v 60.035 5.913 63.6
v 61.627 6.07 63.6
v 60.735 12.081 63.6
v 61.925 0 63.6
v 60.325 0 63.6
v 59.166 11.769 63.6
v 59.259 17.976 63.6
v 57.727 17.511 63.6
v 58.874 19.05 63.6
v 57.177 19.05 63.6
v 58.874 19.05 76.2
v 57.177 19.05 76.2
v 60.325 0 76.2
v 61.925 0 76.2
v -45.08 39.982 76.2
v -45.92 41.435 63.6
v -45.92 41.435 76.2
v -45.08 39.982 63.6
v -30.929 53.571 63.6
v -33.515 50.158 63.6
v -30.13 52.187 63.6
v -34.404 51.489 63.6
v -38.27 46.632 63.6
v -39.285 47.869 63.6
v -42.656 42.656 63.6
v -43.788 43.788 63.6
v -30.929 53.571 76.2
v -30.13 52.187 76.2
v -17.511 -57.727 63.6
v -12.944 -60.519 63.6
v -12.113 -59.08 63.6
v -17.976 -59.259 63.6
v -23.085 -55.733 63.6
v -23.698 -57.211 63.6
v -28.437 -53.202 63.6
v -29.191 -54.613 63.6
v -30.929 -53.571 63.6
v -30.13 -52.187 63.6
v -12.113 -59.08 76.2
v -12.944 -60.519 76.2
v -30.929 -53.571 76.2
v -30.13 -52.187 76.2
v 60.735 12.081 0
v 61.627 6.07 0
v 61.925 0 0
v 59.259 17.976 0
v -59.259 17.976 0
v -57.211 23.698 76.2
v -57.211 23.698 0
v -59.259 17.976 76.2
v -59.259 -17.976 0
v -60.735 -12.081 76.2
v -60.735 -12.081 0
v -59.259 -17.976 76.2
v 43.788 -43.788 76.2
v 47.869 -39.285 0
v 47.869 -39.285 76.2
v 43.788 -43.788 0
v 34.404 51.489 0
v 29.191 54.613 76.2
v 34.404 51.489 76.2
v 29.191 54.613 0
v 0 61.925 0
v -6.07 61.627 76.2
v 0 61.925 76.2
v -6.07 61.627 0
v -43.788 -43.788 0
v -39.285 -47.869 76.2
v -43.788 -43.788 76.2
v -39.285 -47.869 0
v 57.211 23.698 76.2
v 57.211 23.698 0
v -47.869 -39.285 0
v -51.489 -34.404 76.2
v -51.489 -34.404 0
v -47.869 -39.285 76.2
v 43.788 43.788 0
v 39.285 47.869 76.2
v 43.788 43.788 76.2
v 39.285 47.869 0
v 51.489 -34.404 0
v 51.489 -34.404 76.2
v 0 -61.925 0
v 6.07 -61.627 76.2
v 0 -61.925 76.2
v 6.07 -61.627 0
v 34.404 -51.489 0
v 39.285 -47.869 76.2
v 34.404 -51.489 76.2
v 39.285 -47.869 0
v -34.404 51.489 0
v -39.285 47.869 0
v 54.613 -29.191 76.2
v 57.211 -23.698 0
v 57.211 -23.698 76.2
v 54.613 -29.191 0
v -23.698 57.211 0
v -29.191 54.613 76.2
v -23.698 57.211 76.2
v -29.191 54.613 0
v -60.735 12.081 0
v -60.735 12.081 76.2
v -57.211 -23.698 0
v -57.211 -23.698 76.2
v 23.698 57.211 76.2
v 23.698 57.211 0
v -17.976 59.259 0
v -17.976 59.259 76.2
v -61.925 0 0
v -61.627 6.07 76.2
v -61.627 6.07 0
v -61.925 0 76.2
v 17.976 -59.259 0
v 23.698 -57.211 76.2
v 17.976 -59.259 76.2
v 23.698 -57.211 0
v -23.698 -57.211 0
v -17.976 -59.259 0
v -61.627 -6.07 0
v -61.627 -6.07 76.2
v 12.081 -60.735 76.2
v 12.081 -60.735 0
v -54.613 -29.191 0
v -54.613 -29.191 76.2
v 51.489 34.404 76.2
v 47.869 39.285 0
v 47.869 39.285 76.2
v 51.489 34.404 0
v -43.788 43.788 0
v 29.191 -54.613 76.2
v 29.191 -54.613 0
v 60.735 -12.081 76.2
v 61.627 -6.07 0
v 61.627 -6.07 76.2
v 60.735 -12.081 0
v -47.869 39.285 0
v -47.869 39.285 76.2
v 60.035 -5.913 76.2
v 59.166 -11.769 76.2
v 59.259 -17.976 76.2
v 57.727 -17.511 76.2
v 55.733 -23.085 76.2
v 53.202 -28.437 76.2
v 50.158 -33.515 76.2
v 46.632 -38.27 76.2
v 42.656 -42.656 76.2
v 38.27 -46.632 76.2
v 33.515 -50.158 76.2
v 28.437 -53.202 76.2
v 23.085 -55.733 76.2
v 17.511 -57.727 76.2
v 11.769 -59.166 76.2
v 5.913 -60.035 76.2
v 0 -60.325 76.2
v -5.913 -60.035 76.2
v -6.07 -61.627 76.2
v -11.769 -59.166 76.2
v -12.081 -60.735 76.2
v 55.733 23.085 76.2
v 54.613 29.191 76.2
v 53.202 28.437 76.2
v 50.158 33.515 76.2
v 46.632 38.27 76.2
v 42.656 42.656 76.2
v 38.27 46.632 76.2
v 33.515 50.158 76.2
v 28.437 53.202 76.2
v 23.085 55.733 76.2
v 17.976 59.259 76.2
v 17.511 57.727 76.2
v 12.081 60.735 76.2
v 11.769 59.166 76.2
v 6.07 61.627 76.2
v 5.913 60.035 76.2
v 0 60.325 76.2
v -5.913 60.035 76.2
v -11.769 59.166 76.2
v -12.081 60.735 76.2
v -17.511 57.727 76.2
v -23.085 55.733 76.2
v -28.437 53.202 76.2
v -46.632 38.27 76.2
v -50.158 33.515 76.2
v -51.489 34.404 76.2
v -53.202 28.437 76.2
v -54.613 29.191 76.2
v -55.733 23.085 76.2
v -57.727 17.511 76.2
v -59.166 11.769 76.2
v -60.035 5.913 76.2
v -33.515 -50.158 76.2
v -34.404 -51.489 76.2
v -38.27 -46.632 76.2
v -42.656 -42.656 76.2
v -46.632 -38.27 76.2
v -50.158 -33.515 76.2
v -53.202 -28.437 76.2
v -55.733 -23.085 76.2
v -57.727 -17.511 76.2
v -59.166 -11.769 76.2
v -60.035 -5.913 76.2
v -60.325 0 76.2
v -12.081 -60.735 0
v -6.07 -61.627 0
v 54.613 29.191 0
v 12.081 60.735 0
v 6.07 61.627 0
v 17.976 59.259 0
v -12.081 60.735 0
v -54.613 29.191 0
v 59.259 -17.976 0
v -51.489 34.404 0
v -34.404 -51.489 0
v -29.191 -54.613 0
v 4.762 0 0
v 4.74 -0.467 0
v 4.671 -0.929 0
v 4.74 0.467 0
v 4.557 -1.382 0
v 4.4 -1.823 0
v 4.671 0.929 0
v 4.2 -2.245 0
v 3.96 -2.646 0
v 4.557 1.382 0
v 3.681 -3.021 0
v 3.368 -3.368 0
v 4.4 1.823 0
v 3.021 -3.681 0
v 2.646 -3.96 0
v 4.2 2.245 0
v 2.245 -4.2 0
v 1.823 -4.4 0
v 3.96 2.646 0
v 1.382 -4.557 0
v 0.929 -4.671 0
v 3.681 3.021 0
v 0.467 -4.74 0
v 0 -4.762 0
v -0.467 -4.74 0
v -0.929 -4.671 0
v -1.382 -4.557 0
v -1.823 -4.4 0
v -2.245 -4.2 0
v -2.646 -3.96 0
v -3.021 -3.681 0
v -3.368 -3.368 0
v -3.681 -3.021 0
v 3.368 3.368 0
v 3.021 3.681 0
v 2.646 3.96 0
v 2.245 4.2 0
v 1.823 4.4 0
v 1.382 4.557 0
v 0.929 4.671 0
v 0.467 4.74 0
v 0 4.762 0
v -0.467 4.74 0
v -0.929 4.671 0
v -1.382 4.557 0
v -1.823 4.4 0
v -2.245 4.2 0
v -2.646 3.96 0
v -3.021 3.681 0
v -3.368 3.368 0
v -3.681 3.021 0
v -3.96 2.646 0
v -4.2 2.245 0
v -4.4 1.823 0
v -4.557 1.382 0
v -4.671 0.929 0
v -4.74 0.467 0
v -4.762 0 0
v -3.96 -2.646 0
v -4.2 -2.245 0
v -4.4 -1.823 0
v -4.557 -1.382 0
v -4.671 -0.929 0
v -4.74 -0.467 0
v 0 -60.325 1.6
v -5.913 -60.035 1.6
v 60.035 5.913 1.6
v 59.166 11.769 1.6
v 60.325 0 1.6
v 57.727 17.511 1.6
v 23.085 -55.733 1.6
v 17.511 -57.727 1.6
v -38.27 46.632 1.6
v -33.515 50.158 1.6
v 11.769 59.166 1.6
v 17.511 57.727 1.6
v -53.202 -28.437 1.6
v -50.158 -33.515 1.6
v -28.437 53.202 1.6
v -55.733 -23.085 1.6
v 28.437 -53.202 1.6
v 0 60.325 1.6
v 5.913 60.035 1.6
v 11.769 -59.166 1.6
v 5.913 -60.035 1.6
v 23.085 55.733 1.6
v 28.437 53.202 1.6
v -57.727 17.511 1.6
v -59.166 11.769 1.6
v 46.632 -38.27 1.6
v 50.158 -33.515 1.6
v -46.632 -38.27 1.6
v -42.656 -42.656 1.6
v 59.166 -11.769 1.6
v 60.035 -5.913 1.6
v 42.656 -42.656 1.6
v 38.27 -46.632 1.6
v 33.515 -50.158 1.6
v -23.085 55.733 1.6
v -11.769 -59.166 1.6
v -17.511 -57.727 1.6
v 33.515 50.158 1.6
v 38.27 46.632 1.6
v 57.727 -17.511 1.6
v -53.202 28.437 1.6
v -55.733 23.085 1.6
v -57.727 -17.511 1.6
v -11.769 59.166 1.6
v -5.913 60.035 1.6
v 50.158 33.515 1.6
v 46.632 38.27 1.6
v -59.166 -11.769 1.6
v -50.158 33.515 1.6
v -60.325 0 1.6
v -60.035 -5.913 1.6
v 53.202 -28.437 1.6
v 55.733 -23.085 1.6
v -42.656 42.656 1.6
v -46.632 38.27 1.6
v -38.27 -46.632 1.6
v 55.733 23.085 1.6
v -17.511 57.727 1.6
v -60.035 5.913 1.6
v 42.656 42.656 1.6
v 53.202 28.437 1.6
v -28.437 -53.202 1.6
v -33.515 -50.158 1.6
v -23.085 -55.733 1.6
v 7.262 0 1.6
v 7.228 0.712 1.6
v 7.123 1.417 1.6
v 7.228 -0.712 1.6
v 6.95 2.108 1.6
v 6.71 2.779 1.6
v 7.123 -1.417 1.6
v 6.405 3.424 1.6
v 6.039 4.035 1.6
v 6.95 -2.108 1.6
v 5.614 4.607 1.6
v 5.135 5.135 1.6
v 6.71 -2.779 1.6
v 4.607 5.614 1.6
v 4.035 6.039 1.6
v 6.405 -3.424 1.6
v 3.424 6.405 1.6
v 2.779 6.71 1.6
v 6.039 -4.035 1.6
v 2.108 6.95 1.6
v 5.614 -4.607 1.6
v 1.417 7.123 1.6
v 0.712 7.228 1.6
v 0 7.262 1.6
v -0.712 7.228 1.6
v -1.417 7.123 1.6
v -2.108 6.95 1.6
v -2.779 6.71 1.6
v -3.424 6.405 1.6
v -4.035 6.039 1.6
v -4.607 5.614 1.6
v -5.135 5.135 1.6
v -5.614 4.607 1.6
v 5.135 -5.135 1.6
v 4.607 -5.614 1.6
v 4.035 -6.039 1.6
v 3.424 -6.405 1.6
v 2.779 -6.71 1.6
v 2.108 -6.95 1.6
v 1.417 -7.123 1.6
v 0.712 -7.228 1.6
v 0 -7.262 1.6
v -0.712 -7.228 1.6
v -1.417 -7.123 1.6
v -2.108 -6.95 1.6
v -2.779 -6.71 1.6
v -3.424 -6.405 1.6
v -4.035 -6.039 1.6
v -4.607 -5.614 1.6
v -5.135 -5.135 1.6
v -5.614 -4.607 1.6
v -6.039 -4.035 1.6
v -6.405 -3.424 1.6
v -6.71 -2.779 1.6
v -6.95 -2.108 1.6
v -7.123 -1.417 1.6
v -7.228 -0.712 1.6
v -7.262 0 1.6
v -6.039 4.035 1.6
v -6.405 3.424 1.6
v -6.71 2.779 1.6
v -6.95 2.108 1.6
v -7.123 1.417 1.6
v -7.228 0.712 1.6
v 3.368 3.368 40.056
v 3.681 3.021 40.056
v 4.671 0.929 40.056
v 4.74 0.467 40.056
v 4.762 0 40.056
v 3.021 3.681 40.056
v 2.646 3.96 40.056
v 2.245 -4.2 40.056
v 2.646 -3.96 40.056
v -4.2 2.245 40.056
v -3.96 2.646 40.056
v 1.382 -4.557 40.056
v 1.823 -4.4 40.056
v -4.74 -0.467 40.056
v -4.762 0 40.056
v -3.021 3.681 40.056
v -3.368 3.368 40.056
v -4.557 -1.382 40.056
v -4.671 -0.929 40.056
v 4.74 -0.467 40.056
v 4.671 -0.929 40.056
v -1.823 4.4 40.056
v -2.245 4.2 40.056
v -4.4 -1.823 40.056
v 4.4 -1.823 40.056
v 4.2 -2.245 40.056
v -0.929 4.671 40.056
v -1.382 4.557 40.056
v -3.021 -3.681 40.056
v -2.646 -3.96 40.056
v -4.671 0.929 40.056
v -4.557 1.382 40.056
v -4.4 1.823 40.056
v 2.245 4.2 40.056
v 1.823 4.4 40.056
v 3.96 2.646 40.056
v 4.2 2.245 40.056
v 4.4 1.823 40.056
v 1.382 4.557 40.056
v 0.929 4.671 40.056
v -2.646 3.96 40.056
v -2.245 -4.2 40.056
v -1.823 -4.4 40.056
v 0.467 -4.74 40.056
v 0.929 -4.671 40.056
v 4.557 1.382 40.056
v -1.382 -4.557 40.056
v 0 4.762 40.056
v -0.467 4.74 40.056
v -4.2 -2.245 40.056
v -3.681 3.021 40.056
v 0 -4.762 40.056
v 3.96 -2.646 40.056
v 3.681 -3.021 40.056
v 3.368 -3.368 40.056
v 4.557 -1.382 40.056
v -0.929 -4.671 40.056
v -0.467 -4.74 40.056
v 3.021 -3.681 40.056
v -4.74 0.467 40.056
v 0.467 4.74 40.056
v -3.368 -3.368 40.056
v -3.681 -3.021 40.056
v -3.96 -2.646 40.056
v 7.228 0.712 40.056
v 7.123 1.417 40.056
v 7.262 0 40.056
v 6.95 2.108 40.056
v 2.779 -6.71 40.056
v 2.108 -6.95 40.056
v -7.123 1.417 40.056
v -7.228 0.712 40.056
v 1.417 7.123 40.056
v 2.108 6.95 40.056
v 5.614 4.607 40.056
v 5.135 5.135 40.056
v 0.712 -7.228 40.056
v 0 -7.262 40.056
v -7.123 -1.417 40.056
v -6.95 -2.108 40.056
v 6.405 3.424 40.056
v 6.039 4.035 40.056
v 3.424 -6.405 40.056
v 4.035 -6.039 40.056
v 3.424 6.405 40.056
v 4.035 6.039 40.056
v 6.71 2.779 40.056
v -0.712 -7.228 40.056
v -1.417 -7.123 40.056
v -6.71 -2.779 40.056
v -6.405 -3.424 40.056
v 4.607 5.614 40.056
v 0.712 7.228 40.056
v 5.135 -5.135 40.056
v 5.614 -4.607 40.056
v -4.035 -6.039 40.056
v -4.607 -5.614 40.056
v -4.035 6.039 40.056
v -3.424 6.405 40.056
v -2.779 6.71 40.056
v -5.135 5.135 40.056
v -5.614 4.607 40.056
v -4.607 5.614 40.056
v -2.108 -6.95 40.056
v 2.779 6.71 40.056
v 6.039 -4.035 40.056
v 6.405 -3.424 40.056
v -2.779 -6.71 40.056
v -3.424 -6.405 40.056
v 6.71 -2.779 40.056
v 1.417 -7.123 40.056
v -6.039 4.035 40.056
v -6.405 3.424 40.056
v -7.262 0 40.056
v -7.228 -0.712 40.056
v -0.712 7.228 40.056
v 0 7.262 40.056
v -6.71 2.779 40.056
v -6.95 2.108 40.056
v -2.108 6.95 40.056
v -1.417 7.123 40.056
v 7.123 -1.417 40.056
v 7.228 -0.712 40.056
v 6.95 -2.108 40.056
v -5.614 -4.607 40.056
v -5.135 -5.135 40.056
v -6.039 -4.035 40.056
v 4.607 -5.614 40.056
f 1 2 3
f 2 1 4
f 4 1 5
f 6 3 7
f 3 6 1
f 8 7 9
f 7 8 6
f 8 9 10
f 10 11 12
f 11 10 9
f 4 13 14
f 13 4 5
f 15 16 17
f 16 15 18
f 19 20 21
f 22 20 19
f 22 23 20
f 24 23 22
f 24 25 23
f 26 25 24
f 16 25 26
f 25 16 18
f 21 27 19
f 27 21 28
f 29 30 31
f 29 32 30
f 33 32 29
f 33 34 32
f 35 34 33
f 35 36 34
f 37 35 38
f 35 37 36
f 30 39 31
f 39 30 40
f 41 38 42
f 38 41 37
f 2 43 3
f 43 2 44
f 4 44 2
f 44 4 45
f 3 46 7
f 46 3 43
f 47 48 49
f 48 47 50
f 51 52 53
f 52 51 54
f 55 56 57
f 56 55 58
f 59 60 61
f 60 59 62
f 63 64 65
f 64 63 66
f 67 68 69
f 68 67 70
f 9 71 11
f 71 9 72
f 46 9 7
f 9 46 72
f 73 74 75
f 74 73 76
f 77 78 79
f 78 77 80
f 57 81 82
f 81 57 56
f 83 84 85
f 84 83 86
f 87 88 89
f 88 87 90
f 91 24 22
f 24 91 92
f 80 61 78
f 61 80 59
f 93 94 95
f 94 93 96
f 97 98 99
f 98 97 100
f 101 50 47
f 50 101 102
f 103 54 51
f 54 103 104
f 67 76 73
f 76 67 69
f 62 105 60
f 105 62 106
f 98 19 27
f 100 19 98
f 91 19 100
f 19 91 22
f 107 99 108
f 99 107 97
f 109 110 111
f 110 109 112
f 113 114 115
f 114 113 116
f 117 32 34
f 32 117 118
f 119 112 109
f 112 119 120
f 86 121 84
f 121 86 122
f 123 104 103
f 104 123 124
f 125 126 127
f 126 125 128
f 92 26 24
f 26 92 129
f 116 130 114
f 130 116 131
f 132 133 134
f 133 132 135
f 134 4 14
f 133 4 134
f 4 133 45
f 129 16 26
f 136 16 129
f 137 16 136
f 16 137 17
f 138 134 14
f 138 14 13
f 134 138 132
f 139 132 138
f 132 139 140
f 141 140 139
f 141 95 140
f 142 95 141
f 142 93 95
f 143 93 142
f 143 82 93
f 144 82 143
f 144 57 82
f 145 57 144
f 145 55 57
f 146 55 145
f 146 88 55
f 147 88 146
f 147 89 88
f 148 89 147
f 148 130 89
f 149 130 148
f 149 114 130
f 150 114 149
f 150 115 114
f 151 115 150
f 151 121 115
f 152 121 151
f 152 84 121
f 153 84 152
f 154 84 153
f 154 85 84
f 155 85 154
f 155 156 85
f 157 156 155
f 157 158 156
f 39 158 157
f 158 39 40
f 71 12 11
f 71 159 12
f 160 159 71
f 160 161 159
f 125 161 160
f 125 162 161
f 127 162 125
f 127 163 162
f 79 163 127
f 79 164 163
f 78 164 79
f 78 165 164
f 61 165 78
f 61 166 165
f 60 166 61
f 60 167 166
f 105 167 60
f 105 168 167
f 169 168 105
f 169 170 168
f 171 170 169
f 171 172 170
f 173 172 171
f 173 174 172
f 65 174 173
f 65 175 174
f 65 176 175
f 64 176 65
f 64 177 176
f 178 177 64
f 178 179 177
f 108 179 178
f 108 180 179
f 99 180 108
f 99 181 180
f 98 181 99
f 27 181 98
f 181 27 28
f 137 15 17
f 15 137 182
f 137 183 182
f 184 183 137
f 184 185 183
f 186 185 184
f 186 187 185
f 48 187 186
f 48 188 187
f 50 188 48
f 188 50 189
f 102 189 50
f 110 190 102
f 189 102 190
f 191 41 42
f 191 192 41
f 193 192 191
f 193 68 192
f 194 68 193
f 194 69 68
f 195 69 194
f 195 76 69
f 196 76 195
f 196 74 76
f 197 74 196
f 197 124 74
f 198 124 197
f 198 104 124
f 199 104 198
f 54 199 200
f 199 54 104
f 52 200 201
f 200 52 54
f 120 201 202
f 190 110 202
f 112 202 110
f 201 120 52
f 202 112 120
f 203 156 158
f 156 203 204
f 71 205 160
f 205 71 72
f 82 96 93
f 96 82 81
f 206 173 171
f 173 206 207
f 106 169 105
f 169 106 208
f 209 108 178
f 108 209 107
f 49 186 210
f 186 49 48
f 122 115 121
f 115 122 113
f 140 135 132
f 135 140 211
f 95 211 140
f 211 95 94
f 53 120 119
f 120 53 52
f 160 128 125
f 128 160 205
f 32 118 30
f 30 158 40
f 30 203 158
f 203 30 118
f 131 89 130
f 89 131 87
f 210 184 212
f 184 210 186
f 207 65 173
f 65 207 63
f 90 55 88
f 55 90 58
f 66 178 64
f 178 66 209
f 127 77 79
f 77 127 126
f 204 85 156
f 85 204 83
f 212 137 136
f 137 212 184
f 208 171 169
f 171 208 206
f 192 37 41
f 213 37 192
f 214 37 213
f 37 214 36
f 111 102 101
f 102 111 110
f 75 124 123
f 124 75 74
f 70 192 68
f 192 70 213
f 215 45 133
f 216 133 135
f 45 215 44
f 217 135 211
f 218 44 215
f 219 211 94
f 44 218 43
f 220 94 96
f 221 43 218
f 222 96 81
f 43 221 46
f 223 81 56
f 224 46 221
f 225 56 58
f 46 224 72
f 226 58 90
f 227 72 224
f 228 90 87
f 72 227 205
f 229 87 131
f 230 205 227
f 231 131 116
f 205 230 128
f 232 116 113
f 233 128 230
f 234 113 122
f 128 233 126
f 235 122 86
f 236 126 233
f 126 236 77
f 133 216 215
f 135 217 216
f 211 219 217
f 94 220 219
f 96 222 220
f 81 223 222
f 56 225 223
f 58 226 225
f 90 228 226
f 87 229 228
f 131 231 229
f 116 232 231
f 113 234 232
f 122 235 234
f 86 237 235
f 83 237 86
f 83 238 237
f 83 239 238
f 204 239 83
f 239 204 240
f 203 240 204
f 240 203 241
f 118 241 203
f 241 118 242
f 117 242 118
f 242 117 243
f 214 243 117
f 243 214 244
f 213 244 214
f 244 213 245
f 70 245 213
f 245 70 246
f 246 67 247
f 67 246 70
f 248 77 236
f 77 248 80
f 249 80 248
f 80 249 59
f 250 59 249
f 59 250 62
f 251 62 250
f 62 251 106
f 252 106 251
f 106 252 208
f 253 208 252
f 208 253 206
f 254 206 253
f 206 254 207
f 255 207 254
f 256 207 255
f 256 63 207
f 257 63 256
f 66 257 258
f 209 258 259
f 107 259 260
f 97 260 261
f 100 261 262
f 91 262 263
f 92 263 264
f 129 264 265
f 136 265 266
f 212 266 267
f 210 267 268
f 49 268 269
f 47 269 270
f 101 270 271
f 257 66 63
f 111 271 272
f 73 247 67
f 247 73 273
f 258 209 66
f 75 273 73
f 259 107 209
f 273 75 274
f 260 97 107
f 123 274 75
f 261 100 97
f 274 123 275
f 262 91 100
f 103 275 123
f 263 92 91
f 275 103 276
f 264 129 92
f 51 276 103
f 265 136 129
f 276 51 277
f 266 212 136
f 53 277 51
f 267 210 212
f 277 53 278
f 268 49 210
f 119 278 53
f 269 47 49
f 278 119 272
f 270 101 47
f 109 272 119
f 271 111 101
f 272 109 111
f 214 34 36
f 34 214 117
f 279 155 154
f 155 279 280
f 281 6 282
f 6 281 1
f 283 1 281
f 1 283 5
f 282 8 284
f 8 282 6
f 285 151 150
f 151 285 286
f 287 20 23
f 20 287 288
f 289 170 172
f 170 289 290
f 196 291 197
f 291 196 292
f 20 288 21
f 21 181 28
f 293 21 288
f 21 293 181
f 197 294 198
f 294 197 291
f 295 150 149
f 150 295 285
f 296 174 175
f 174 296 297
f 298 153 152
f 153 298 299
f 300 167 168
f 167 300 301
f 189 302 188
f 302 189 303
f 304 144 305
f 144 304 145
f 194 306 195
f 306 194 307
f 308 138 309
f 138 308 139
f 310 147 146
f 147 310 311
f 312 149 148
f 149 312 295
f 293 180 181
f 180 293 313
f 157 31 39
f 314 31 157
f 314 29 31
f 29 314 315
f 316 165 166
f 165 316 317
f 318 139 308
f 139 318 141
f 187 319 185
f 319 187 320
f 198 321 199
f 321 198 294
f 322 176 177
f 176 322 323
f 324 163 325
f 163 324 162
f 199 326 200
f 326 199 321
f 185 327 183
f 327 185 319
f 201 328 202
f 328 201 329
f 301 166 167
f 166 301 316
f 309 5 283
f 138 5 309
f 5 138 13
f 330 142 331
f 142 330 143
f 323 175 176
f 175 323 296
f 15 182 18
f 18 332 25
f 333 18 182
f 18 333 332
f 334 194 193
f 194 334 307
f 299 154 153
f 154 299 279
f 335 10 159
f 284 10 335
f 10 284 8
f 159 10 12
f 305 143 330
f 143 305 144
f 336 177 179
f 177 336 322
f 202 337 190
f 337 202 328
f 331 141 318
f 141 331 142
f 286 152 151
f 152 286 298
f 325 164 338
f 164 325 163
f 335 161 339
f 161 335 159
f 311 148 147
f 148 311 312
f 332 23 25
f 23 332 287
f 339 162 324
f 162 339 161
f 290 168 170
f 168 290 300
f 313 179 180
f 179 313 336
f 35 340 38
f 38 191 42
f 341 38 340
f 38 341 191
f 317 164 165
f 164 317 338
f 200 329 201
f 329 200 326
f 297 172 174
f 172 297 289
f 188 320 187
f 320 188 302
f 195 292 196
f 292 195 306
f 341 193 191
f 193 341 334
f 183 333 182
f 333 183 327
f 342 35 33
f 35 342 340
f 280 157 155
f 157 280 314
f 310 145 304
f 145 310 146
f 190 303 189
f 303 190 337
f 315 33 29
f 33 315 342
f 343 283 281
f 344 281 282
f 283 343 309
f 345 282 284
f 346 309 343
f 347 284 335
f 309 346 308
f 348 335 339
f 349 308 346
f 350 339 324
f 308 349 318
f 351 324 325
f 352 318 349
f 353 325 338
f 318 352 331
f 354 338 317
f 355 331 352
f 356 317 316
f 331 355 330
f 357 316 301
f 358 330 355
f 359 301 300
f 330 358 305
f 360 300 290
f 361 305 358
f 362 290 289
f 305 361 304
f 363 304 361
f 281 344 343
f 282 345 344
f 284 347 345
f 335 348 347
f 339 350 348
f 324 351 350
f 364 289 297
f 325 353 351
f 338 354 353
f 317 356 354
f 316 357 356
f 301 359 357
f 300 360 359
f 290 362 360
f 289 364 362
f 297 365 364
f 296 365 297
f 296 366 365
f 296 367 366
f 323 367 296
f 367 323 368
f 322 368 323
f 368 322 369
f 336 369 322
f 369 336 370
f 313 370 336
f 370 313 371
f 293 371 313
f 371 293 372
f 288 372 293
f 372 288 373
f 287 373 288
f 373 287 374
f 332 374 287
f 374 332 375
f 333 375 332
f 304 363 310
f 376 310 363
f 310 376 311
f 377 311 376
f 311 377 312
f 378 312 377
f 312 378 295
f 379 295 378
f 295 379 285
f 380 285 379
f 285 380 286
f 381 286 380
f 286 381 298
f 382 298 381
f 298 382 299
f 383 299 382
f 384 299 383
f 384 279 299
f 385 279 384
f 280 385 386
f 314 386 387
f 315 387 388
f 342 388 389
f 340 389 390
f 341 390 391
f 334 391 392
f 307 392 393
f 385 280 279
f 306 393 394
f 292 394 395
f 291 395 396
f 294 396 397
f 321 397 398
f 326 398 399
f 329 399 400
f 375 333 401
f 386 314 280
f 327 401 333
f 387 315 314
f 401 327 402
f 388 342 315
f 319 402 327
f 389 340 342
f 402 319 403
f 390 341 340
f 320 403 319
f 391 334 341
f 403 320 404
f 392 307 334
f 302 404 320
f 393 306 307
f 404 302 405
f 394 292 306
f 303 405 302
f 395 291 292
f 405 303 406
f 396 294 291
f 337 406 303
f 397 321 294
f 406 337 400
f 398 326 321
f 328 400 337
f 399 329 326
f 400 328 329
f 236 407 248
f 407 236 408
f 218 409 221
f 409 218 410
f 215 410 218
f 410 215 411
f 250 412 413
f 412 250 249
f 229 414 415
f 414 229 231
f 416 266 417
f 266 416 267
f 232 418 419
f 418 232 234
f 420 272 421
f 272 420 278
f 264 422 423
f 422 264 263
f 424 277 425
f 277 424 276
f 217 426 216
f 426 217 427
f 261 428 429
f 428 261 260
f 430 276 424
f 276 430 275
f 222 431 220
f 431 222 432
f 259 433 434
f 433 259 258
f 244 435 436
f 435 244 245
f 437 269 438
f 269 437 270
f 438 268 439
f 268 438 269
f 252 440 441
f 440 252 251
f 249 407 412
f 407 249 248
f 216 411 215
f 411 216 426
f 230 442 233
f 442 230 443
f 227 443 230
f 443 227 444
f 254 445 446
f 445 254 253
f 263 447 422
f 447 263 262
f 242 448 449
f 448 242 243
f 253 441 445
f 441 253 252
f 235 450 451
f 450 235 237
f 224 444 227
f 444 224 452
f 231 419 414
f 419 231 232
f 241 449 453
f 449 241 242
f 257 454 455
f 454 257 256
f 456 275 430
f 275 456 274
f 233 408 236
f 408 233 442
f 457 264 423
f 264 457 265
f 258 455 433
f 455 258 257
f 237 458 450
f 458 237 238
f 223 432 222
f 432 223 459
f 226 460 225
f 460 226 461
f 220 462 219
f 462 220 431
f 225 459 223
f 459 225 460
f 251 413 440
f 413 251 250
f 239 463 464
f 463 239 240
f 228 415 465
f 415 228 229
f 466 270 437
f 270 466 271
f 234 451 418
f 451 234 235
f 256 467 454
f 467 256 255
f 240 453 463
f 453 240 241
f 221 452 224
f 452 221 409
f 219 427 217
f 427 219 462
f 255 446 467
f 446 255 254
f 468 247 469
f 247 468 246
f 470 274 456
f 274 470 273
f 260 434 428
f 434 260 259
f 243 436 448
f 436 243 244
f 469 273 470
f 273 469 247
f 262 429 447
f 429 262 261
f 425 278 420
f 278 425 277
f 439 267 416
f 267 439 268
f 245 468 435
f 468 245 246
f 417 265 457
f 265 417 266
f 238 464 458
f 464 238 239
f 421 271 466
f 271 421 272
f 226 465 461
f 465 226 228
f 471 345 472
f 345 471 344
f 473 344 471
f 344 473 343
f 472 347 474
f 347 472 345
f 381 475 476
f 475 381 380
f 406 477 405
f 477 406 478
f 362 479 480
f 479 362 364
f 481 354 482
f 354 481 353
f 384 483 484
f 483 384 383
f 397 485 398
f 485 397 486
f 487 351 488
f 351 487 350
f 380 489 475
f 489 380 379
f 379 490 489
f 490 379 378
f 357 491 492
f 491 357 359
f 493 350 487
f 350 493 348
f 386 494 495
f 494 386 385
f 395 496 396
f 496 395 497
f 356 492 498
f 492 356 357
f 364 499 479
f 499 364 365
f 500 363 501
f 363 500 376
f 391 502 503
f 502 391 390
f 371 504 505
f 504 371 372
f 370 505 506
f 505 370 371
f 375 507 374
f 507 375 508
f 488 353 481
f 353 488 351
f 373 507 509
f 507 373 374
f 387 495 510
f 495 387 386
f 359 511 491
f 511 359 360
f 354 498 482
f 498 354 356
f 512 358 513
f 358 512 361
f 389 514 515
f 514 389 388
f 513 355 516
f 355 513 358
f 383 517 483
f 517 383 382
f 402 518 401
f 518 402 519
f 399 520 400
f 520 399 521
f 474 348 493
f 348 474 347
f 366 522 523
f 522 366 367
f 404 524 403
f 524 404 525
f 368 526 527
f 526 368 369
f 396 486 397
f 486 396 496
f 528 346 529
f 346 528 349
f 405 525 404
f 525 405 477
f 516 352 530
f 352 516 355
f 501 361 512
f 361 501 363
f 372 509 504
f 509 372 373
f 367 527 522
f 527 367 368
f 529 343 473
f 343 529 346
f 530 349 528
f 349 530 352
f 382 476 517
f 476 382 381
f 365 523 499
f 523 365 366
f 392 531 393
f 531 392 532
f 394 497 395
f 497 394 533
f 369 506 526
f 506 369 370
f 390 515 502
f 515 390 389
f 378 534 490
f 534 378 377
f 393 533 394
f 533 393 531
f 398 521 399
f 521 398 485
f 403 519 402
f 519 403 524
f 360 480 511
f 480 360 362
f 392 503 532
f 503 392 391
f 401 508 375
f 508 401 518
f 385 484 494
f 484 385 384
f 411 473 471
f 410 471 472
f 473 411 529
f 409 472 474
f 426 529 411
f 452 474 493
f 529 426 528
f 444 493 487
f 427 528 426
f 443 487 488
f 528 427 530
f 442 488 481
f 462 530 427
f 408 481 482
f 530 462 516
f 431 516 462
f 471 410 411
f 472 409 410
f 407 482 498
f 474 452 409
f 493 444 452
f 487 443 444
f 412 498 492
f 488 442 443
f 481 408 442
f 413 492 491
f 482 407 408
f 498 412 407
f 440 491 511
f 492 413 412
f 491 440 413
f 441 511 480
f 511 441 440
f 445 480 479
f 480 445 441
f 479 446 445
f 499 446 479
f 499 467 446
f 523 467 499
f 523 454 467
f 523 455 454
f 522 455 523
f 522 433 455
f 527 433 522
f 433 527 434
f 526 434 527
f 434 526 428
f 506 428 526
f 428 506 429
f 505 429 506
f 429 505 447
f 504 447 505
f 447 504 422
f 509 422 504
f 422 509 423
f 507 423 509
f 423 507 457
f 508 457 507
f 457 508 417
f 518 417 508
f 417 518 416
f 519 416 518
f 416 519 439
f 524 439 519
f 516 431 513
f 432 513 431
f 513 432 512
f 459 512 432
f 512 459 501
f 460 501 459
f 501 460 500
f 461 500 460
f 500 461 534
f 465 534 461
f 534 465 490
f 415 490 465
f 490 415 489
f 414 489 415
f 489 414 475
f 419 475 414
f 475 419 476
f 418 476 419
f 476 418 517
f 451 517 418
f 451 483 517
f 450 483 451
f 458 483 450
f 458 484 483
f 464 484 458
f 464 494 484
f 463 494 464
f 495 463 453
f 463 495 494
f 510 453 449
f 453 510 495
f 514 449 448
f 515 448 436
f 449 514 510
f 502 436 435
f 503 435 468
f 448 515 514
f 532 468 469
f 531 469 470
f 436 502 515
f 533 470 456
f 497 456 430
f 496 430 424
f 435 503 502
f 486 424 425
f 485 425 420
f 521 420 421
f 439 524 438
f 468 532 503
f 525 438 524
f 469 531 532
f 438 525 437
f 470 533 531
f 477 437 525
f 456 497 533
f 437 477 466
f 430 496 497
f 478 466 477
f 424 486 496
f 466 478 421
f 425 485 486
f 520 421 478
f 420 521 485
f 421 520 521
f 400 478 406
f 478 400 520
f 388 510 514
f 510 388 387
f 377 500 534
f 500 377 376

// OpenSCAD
//
// Antek AS-1 cover
//

mm=25.4;
$fn=64;
e = 0.1;

id = 4.75*mm;
hgt = 3.0*mm;

wthk = 1.6;
bthk = 1.6;

hdia = (3/8)*mm;

od = id + 2*wthk;

// flange
fhgt = 1.64*mm-bthk;
fid = hdia;
fod = hdia+5;

cut_hgt = 0.5*mm;
cut_wid = 0.75*mm;
cut_num = 3.0;

module wall() {
     difference() {
	  cylinder( d=od, h=hgt);
	  translate( [0, 0, -e])
	       cylinder( d=id, h=hgt+2*e);
	  for( i=[0:cut_num-1]) {
	       translate( [0, 0, hgt-cut_hgt+e])
	       rotate( [0, 0, 360*(i/cut_num)])
		    cube( [od+10, cut_wid, cut_hgt]);
	  }
     }
}

module hole_at(x,y,dia) {
     translate( [x, y, -e])
	  cylinder( h=bthk+2*e, d=dia);
}

module base() {
     difference() {
	  cylinder( d=od, h=bthk);
	  hole_at( 0, 0, hdia);
     }
     difference() {
	  cylinder( d=fod, h=fhgt);
	  translate( [0, 0, -e])
	       cylinder( d=fid, h=fhgt+2*e);
     }
}

wall();
base();
